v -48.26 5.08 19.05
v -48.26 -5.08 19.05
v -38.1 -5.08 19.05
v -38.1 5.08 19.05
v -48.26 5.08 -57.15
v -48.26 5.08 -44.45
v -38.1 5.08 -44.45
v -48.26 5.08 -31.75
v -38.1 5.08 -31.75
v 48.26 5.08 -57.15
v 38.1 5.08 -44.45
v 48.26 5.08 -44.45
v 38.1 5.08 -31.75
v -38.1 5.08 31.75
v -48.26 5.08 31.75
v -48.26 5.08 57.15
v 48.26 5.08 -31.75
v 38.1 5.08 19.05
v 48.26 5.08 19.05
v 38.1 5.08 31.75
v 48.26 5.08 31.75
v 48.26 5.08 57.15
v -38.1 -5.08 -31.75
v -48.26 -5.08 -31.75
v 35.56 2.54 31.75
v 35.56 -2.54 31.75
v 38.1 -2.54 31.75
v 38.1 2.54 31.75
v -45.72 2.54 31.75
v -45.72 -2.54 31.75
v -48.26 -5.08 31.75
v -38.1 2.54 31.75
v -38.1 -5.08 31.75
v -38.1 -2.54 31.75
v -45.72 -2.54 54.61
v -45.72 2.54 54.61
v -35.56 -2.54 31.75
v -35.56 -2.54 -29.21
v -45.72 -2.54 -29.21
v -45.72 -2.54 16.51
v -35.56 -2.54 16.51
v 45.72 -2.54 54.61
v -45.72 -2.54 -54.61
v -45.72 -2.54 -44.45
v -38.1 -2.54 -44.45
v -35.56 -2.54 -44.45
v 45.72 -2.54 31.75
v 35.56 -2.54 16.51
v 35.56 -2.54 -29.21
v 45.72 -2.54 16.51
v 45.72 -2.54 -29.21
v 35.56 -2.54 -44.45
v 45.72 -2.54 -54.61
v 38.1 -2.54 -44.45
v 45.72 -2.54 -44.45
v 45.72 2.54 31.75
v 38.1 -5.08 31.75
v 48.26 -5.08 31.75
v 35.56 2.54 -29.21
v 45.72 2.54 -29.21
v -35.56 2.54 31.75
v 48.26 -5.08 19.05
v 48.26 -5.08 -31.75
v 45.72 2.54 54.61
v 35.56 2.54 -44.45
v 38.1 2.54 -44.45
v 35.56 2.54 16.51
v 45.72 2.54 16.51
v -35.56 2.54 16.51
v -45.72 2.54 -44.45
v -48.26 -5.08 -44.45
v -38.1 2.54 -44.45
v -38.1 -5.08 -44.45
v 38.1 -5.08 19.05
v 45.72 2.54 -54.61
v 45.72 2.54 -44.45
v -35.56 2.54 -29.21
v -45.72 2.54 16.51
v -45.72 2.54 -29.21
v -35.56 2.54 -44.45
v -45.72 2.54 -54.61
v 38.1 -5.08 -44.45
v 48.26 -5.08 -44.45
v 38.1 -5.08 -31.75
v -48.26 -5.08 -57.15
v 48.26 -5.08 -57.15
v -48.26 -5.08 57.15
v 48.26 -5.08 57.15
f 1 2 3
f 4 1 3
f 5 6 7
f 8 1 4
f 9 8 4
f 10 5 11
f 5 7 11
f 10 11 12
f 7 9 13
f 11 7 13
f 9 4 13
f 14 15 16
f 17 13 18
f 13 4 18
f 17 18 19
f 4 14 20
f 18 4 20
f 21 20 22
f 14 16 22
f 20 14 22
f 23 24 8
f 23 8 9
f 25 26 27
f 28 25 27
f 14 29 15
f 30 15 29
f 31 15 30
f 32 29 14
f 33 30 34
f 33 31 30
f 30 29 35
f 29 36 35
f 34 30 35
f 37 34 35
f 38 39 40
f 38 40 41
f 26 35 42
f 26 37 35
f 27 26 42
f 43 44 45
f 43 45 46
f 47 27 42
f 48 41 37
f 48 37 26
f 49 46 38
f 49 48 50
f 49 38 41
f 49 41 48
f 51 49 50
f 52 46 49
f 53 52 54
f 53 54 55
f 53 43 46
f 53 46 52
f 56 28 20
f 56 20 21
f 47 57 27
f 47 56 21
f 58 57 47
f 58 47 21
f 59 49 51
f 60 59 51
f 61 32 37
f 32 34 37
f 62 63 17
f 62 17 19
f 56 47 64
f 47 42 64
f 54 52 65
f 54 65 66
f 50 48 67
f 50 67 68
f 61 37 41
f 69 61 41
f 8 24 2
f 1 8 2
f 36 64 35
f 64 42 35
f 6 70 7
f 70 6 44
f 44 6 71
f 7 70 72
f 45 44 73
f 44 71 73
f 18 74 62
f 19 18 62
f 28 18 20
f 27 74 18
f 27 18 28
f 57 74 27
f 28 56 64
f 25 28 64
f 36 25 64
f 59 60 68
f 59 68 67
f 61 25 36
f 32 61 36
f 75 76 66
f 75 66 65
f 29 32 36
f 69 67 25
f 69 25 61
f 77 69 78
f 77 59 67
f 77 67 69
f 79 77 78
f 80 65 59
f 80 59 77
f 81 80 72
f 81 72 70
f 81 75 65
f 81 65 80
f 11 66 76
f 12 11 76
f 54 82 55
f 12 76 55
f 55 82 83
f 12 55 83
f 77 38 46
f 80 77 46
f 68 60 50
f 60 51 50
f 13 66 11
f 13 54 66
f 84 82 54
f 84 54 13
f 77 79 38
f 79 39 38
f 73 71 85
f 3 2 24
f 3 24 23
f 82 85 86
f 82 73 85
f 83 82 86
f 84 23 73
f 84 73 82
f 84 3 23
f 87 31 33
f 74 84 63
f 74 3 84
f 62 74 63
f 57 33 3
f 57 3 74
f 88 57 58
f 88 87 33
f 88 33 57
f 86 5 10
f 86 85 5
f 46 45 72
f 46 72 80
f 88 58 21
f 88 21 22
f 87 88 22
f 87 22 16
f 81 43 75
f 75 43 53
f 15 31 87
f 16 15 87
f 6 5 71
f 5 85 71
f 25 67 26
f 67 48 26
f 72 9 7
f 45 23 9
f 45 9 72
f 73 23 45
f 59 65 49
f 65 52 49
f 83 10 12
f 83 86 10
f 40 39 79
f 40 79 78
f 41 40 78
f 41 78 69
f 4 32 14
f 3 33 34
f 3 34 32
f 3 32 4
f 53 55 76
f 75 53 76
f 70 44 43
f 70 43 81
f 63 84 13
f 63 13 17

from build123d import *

# Parameters (mm, degrees)
F0_W     = 10.16
F0_H     = 12.7
F0_H_2   = 50.8
F0_H_3   = 25.4
F1_DEPTH = 5.08
F2_T     = -2.54


# Not quite as in the source:
# - a shell that OpenCascade refuses in one call is made with other operations: the cavity is built on its own and cut out


with BuildPart() as f1:
    # F0 (on Front) → F1 (new body, symmetric)
    with BuildSketch(Plane.XZ):
        Polygon((-38.1, -57.15), (38.1, -57.15), (38.1, -44.45), (38.1, -31.75), (38.1, 19.05), (38.1, 31.75), (38.1, 57.15), (-38.1, 57.15), (-38.1, 31.75), (-38.1, 19.05), (-38.1, -31.75), (-38.1, -44.45), align=None)
        with Locations((43.18, -50.8)):
            Rectangle(F0_W, F0_H)
        with Locations((-43.18, -50.8)):
            Rectangle(F0_W, F0_H)
        with Locations((43.18, -6.35)):
            Rectangle(F0_W, F0_H_2)
        with Locations((-43.18, -6.35)):
            Rectangle(F0_W, F0_H_2)
        with Locations((43.18, 44.45)):
            Rectangle(F0_W, F0_H_3)
        with Locations((-43.18, 44.45)):
            Rectangle(F0_W, F0_H_3)
    extrude(amount=F1_DEPTH, both=True)

    # F2: a shell. OpenCascade refuses it in one call, so the cavity is built on its own and cut out:
    # the body offset inwards by the wall thickness, plus a prism from it out through each open face.
    f2_core = offset(f1.part, amount=F2_T, kind=Kind.INTERSECTION, mode=Mode.PRIVATE)
    f2_exits = [f2_core.faces().sort_by_distance(p)[0] for p in [
        (40.64, 0, 34.29),
        (40.64, 0, -46.99),
        (-40.64, 0, -46.99),
        (-40.64, 0, 34.29),
    ]]
    add(f2_core, mode=Mode.SUBTRACT)
    extrude(f2_exits, amount=-F2_T, mode=Mode.SUBTRACT)


solid = f1.part
